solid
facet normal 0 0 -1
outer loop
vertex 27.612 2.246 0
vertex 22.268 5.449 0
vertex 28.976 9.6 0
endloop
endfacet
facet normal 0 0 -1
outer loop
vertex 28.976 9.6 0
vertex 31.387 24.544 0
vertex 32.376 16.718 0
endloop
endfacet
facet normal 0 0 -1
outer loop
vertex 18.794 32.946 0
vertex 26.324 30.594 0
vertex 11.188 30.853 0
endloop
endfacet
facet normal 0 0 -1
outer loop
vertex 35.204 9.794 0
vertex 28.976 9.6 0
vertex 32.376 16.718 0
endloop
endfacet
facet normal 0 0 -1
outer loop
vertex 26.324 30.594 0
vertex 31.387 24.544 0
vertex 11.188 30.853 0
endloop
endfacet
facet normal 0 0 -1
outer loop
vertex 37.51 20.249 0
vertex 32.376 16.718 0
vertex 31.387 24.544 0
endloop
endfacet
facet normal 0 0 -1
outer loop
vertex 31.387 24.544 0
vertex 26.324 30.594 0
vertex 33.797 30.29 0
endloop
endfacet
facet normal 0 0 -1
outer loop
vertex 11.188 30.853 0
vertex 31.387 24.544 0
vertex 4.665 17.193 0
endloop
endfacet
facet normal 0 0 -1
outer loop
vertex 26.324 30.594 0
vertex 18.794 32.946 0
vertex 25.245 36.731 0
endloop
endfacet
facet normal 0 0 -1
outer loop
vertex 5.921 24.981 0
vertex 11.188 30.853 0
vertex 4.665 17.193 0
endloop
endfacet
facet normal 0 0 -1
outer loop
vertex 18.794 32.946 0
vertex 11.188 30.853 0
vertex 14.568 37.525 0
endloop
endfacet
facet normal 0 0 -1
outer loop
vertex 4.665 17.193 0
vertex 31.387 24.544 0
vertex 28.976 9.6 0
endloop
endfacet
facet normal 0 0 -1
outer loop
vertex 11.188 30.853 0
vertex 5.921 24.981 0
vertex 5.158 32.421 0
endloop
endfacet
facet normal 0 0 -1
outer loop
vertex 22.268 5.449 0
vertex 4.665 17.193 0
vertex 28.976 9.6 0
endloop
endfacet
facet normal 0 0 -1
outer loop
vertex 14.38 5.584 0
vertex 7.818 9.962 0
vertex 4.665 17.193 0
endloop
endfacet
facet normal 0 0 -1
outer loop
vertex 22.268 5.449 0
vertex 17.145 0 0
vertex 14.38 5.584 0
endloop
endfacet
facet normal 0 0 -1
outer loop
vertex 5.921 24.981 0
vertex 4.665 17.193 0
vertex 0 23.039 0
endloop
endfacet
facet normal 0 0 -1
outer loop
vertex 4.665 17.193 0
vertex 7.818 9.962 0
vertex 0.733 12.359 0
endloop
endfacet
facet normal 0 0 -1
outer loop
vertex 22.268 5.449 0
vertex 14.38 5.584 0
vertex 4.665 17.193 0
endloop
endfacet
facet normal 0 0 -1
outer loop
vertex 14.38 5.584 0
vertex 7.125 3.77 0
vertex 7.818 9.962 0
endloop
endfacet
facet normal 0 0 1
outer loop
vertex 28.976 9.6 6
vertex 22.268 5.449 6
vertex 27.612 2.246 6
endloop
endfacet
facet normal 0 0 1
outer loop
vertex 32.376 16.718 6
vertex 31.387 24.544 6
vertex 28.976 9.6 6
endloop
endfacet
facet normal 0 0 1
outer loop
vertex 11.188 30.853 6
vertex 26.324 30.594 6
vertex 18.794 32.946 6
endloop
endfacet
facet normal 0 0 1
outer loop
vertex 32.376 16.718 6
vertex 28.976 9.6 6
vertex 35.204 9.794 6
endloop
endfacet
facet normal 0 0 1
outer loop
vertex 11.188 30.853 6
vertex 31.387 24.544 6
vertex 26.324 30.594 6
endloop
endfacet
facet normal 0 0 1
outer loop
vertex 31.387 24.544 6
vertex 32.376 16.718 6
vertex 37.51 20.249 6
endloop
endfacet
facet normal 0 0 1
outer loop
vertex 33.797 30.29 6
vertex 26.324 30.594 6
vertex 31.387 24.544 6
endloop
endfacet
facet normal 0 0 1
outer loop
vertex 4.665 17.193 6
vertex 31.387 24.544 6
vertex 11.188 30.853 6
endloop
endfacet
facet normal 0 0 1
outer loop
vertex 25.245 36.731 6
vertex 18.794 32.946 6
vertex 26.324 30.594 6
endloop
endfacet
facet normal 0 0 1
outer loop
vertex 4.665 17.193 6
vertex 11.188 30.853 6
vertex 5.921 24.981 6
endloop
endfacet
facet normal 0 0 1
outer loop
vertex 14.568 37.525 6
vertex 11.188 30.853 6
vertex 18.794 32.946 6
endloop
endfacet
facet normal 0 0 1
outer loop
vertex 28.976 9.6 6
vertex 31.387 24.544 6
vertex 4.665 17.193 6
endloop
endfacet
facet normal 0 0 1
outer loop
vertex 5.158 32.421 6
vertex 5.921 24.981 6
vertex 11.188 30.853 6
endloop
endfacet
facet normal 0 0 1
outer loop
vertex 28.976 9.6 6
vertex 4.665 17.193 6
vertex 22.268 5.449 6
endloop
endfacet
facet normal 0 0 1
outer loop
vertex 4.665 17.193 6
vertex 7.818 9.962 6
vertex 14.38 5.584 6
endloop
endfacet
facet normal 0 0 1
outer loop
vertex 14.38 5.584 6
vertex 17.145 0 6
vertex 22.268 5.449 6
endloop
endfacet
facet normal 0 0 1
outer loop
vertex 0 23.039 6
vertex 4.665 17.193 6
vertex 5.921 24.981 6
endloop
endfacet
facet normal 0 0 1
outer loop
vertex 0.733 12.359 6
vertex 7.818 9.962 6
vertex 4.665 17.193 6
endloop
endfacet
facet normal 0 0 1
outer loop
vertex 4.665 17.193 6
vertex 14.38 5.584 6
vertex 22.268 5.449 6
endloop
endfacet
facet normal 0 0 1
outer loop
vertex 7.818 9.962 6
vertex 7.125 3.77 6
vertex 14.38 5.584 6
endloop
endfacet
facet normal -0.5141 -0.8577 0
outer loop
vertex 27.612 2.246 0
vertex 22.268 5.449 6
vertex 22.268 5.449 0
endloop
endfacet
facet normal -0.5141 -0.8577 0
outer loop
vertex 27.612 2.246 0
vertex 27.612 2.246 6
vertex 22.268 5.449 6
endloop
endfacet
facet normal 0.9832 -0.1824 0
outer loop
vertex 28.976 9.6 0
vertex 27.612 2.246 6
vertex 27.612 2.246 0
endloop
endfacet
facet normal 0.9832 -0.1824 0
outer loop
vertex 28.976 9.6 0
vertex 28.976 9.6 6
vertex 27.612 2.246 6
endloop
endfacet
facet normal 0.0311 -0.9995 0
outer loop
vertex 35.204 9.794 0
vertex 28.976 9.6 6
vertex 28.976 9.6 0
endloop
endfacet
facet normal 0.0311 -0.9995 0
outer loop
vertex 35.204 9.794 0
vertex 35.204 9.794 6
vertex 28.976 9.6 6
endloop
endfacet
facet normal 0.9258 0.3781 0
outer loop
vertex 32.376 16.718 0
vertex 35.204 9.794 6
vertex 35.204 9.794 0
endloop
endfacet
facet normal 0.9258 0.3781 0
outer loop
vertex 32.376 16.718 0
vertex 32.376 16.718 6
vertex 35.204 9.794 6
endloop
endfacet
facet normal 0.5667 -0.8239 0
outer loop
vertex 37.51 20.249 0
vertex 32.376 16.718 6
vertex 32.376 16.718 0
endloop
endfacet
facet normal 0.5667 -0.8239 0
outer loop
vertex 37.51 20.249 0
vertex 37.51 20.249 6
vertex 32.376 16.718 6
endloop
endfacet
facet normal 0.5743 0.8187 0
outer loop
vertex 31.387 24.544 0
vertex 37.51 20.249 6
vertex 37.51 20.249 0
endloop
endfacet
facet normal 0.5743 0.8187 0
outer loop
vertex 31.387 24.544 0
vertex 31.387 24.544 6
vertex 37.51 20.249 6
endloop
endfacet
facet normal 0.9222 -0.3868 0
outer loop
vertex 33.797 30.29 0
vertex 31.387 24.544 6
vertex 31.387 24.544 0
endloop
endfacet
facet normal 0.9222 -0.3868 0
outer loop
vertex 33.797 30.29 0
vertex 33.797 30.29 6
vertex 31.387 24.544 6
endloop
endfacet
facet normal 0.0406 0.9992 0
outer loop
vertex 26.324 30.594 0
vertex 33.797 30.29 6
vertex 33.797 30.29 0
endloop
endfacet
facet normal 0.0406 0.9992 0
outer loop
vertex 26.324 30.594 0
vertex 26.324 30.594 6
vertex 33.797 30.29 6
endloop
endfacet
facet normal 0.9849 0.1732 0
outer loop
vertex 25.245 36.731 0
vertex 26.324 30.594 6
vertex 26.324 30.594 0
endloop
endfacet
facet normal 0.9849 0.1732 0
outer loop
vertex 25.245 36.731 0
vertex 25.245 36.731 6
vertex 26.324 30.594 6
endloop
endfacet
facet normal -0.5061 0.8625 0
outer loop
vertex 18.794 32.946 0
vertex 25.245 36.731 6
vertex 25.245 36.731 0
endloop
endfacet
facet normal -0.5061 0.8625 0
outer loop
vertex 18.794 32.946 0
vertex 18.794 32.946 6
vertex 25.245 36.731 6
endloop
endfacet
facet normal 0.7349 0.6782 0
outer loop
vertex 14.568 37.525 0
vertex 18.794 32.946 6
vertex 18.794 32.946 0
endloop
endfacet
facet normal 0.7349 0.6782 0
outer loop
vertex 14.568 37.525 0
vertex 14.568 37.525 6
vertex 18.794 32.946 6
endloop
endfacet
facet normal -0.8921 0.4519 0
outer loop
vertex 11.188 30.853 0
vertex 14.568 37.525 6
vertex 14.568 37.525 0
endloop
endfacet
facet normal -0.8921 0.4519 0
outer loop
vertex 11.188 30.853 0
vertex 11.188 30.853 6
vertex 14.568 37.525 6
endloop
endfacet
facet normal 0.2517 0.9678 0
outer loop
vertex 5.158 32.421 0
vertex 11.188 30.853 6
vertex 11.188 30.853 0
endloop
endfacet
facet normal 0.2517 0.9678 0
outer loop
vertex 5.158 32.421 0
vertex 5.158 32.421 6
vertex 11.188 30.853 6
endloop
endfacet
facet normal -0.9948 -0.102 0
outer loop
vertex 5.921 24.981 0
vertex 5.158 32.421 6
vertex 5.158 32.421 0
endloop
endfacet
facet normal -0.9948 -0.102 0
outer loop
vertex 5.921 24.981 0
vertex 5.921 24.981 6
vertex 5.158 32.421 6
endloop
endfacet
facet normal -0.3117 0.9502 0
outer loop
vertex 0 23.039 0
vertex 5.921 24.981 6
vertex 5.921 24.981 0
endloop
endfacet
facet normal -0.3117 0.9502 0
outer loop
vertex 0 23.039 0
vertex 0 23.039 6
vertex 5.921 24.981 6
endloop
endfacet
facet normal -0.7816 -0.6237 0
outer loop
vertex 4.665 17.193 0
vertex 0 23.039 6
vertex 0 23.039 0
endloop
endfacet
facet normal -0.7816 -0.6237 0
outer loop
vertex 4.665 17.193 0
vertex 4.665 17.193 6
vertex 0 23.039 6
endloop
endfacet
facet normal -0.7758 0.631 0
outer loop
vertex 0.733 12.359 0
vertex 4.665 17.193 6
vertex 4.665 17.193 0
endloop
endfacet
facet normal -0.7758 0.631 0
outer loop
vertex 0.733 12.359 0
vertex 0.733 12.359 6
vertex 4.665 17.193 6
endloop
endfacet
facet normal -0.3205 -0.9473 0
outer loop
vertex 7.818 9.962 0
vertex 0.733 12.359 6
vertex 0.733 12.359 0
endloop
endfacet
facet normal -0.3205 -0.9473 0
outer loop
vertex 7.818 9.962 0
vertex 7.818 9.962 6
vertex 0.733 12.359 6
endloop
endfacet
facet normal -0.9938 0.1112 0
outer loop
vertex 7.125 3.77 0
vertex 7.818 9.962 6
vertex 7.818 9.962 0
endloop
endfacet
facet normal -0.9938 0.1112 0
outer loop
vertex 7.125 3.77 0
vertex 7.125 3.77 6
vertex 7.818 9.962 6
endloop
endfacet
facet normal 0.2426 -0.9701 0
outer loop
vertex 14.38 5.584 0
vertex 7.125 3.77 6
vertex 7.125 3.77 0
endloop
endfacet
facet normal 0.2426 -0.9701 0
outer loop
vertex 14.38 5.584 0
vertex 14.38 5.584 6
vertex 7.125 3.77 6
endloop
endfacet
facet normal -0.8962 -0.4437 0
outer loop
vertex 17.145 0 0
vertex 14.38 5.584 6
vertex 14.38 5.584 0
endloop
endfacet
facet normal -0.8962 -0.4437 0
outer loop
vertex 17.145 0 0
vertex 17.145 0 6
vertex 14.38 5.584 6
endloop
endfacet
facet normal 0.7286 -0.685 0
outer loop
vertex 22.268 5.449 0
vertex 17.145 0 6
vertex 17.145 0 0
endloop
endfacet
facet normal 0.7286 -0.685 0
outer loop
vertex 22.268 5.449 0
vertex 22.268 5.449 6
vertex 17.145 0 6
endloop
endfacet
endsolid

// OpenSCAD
$fn = 32;

// ----------------------------------------------------------------------
// Chain sprocket: 11 teeth, 14 mm root radius
// ----------------------------------------------------------------------

// --- parameters (mm) ---
profile_height = 6;       // extrusion height
profile_points = 22;      // points of the closed outline

profile = [[32.376, 16.718], [37.51, 20.249], [31.387, 24.544], [33.797, 30.29], [26.324, 30.594], [25.245, 36.731], [18.794, 32.946], [14.568, 37.525], [11.188, 30.853], [5.158, 32.421], [5.921, 24.981], [0, 23.039], [4.665, 17.193], [0.733, 12.359], [7.818, 9.962], [7.125, 3.77], [14.38, 5.584], [17.145, 0], [22.268, 5.449], [27.612, 2.246], [28.976, 9.6], [35.204, 9.794]];  // single closed polygon, 22 points, counter clockwise

// --- the one profile operation ---
linear_extrude(height = profile_height) polygon(points = profile);
